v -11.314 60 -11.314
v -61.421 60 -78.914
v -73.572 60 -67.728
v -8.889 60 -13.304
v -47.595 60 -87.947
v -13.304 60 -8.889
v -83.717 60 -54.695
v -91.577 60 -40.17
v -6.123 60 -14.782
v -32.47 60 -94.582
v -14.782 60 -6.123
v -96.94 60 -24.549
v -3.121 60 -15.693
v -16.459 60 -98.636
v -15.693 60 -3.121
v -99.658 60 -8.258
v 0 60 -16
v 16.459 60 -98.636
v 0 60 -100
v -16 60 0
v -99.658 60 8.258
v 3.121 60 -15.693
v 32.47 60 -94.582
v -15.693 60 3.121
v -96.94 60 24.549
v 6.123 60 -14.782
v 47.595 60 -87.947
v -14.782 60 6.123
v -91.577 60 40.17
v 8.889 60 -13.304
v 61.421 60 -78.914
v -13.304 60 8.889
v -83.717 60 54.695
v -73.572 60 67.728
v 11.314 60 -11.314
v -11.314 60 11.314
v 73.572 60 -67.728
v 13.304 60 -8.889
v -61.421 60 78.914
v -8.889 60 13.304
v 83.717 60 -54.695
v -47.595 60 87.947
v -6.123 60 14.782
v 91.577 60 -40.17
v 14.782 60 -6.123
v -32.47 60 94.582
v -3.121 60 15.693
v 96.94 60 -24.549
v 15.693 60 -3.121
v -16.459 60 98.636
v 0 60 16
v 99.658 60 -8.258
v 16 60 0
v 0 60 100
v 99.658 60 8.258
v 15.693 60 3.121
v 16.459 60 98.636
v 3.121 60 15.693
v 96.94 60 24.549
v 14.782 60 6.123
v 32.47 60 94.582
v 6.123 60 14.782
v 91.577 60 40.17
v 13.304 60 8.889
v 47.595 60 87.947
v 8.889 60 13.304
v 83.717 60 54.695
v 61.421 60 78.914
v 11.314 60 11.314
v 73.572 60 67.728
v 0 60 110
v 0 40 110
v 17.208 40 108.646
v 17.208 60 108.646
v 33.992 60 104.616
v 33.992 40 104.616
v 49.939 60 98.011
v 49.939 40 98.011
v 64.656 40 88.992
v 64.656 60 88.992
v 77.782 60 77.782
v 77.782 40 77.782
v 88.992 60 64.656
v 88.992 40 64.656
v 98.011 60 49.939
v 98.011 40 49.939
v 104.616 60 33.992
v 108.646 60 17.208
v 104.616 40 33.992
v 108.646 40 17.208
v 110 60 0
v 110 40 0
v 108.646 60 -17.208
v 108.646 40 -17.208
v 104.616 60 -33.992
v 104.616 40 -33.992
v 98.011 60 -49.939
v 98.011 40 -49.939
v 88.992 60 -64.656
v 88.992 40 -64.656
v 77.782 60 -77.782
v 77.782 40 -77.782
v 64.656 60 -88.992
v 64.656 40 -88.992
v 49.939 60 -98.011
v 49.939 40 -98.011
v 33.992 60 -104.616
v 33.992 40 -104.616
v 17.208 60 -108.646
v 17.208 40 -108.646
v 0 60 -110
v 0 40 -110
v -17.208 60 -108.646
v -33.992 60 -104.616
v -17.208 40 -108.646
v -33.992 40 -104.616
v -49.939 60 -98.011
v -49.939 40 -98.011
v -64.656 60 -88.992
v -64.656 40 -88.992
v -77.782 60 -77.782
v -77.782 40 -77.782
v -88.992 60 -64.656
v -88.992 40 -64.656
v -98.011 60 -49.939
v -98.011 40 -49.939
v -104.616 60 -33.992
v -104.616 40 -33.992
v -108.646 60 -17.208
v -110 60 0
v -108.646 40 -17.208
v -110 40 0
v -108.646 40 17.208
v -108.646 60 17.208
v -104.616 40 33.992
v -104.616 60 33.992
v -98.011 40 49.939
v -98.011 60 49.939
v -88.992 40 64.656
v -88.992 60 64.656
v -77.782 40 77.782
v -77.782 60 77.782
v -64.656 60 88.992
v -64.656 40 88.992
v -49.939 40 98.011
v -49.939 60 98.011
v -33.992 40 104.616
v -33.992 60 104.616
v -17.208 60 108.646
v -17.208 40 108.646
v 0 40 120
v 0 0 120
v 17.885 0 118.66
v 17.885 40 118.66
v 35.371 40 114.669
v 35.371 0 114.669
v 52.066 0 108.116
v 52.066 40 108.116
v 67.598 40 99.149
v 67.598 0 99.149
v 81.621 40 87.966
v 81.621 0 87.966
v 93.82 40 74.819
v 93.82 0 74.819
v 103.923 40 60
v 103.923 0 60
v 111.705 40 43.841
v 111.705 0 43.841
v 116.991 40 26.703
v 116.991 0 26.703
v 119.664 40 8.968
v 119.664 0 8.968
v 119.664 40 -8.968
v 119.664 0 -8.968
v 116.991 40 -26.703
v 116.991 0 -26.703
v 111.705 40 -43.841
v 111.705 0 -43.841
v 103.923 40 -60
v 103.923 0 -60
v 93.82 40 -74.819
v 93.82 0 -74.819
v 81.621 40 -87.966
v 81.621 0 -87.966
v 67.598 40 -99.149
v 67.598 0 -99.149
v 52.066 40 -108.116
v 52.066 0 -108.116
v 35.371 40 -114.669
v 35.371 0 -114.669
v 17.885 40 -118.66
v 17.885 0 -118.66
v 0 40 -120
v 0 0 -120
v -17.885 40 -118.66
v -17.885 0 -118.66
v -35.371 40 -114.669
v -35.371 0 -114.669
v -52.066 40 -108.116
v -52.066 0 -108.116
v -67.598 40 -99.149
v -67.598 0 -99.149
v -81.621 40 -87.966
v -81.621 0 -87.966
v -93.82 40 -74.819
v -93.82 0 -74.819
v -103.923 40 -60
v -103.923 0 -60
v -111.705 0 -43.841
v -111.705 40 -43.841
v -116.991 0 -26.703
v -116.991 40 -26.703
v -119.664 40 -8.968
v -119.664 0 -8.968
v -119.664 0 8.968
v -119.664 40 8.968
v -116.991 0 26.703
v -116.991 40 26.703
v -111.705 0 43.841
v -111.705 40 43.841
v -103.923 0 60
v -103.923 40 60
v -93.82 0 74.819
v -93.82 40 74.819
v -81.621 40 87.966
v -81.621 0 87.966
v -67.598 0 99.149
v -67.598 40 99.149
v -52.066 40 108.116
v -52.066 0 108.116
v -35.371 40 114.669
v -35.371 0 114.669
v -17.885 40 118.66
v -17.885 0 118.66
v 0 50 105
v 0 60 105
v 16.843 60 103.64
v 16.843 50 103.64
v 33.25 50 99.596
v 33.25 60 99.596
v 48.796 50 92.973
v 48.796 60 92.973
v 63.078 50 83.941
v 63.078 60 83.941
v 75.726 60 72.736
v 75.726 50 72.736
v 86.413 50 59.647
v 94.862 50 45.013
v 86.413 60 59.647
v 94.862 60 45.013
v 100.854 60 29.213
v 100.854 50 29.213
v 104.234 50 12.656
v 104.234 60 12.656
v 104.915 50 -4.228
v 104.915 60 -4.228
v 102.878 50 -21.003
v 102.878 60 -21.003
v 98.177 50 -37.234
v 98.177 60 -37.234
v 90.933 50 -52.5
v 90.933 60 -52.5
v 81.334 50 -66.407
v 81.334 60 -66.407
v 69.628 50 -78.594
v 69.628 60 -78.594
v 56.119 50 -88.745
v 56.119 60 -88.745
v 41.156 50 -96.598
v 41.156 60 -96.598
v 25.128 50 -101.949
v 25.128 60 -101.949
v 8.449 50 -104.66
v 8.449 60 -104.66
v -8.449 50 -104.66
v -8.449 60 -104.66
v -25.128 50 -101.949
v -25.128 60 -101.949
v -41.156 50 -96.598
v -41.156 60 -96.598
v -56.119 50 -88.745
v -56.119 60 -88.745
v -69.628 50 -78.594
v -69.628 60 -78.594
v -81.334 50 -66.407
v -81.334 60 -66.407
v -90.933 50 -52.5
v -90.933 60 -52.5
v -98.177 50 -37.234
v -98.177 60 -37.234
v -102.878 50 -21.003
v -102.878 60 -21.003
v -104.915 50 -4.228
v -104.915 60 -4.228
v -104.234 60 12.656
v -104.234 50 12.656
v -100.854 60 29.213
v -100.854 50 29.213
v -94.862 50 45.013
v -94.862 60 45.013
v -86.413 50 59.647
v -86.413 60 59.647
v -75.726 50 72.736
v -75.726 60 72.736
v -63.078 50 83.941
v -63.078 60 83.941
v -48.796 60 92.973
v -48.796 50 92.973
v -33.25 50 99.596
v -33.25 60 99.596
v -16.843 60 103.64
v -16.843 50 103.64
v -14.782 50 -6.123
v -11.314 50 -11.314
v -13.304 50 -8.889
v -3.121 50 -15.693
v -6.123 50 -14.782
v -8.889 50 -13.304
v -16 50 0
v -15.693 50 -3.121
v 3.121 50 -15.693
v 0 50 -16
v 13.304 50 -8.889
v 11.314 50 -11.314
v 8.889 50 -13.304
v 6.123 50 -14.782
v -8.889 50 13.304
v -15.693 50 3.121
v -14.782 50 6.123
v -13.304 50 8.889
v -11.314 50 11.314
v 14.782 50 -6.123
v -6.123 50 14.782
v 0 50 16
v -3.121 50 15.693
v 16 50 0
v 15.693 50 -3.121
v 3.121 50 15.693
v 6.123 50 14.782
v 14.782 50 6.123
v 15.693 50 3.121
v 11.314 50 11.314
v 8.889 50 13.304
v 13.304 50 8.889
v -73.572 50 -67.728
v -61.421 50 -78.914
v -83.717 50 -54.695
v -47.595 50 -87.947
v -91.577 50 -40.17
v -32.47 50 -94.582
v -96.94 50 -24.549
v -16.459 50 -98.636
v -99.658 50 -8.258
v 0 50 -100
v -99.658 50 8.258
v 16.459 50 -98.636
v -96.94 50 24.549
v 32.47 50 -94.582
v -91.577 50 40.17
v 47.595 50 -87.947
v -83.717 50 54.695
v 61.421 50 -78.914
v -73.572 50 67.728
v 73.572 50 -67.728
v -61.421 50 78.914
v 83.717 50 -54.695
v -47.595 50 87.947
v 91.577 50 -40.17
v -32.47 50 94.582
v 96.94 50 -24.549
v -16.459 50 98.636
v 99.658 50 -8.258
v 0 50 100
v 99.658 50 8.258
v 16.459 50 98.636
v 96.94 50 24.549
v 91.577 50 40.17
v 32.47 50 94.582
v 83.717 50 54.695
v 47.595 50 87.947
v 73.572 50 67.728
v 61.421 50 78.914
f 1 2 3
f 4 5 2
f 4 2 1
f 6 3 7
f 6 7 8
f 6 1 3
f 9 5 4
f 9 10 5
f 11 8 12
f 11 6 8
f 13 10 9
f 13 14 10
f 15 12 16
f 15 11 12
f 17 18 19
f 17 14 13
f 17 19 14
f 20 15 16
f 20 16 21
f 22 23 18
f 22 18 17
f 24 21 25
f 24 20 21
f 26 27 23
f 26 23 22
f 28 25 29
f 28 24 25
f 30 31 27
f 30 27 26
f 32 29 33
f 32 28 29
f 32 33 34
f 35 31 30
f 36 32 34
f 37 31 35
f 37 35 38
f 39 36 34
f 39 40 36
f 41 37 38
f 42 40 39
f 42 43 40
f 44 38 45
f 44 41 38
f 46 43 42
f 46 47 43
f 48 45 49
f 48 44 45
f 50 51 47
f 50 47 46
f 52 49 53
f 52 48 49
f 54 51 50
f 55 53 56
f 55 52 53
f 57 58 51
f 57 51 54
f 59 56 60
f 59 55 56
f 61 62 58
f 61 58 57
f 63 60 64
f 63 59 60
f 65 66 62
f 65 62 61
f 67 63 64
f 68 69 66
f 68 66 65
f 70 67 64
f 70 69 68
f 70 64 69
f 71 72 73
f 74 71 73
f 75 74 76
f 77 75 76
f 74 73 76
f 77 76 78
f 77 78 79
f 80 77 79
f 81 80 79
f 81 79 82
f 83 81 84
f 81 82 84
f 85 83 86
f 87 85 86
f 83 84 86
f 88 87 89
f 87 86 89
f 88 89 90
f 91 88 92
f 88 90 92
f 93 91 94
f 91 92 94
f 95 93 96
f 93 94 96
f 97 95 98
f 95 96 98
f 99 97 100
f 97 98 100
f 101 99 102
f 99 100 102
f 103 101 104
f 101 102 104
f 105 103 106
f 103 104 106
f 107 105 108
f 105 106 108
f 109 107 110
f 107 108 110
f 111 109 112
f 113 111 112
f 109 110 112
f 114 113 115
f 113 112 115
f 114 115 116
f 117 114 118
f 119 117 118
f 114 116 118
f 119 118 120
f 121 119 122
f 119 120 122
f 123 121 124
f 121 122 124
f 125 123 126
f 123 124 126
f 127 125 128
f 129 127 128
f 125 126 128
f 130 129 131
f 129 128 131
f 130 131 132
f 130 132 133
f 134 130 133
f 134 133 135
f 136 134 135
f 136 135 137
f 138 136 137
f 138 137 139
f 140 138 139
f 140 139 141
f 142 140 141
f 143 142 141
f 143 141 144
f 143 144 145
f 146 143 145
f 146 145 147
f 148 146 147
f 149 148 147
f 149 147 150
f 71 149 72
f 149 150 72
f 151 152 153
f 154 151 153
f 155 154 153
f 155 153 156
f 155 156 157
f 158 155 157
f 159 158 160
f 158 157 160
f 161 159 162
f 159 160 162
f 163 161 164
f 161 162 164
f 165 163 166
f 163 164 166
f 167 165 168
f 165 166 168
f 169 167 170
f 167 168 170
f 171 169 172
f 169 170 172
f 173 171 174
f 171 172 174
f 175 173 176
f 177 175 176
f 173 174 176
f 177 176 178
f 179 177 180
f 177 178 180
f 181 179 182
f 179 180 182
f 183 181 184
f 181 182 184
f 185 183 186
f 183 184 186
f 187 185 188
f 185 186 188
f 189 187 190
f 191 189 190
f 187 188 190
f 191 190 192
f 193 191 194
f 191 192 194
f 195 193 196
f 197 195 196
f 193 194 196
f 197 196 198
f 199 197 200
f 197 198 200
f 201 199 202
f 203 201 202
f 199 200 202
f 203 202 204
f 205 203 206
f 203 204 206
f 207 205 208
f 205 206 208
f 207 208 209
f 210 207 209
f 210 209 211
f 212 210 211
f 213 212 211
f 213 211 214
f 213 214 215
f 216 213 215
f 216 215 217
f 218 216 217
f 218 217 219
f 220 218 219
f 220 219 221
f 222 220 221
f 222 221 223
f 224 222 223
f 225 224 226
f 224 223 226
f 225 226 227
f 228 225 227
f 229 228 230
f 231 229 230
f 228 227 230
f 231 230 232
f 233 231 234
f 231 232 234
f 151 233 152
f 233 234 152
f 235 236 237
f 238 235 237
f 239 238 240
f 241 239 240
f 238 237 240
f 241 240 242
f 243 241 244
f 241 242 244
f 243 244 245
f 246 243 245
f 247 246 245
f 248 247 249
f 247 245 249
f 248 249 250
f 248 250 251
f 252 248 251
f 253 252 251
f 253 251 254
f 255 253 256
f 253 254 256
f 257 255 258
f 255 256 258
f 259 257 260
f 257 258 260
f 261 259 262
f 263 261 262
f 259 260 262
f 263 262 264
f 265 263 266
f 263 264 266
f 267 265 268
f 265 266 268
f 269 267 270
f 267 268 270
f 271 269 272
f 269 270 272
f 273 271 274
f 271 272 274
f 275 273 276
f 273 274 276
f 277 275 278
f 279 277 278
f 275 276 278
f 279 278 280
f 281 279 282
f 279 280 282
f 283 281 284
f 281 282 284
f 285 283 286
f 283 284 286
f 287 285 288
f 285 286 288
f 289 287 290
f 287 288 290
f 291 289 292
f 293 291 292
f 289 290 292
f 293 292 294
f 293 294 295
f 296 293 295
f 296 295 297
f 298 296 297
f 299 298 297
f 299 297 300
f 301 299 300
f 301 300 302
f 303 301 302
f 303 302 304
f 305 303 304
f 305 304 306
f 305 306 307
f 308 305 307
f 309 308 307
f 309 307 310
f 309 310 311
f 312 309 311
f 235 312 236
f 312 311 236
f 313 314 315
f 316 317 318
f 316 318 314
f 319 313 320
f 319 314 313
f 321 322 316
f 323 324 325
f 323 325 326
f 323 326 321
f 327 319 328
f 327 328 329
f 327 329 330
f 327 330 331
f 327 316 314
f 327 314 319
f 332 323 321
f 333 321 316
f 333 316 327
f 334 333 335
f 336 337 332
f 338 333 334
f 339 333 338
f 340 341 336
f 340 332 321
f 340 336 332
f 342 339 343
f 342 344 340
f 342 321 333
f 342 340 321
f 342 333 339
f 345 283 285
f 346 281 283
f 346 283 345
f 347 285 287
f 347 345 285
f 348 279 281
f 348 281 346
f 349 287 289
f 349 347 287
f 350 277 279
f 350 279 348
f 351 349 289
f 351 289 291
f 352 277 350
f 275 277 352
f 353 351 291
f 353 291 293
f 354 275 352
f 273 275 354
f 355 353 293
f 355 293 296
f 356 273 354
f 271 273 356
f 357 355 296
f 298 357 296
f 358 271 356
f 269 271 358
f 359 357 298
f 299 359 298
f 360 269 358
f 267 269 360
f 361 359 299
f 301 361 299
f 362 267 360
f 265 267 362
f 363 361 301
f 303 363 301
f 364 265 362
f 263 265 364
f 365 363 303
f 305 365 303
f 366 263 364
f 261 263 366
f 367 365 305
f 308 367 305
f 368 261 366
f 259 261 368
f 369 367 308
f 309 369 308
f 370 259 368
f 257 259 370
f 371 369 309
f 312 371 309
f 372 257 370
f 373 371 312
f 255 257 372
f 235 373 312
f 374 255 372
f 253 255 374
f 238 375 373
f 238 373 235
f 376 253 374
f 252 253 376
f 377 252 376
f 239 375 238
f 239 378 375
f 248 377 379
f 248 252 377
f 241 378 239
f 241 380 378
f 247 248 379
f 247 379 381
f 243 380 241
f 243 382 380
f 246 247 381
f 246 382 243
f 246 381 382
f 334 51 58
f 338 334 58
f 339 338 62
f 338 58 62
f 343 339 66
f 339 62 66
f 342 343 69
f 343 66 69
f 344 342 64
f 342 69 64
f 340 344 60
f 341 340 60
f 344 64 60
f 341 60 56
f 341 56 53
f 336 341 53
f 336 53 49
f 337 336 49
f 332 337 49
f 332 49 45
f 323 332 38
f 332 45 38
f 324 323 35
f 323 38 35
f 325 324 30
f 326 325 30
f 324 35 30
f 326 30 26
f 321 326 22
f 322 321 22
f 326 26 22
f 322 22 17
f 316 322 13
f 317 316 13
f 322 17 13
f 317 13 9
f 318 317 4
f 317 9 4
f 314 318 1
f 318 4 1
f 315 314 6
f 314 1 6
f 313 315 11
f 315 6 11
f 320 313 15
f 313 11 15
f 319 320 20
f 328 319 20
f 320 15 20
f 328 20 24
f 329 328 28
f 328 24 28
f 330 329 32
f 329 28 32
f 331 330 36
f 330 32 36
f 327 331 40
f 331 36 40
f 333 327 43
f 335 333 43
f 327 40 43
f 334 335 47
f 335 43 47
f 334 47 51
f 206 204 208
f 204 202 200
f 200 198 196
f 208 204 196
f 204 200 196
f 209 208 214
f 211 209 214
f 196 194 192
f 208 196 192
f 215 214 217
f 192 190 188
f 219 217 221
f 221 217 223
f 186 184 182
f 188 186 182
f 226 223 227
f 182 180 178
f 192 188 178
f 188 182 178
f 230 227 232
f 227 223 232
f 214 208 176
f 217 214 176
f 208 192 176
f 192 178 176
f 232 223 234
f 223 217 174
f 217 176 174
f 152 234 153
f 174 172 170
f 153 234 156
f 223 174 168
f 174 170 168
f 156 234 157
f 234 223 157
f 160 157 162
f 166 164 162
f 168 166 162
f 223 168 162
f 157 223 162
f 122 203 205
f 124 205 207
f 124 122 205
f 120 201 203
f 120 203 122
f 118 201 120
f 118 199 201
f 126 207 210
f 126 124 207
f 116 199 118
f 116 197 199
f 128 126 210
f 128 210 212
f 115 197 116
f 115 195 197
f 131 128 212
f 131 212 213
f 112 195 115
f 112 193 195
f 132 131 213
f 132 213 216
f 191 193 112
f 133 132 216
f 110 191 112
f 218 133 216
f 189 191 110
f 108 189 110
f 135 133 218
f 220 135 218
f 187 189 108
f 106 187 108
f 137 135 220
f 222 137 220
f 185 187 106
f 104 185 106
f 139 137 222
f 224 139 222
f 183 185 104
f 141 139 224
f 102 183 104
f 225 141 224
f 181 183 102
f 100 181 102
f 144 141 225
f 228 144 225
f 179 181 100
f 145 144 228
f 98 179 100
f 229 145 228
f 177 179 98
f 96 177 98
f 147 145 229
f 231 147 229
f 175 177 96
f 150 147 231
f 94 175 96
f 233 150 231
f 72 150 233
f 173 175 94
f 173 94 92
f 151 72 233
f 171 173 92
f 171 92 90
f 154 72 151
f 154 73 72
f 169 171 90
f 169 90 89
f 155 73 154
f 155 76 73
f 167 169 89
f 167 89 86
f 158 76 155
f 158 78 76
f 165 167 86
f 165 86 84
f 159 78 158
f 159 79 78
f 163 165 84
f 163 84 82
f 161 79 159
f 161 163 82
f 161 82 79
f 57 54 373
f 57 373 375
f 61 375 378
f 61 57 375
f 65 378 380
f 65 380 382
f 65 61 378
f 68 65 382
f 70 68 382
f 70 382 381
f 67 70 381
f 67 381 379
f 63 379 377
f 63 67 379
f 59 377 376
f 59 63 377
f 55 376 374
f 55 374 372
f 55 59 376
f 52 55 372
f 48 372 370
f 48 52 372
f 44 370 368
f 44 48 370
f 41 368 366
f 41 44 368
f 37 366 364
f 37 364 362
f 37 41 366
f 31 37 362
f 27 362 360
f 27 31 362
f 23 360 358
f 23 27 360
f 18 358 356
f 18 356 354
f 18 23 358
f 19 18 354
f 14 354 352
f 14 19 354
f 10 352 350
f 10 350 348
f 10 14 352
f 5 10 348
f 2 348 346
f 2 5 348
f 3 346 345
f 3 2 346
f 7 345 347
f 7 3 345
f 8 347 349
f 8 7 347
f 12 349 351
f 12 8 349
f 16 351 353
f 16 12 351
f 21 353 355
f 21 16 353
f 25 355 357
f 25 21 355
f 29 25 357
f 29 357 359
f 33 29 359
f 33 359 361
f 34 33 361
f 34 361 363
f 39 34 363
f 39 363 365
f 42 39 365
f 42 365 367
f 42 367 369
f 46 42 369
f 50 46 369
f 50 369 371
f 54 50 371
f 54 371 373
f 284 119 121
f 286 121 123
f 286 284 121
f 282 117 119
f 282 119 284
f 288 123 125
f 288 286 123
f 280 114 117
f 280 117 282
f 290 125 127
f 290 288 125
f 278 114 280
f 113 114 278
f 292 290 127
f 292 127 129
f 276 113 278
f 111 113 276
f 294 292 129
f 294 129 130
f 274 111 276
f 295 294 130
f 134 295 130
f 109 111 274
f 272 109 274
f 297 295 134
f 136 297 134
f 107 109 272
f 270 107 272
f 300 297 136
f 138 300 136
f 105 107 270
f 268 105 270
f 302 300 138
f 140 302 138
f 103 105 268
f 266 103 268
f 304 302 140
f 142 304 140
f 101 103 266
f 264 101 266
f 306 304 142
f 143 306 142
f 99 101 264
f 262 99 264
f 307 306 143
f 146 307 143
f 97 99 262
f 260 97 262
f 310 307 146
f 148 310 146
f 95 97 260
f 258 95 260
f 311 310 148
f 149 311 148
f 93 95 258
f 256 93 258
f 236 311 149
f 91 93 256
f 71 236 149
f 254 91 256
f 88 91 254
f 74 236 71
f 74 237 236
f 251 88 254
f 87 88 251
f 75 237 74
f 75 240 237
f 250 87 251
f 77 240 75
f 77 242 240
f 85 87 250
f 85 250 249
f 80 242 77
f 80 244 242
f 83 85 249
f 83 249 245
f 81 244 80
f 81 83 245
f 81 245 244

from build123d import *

# Parameters (mm, degrees)
SKETCH1_R           = 120
BOSS_EXTRUDE1_DEPTH = 40
BOSS_EXTRUDE2_START = 40
SKETCH1_3_R         = 110
BOSS_EXTRUDE2_DEPTH = 20
CUT_EXTRUDE1_START  = 60
SKETCH1_5_R         = 105
SKETCH1_5_R_2       = 100
CUT_EXTRUDE1_DEPTH  = 10
SKETCH2_R           = 16
CUT_EXTRUDE2_DEPTH  = 10


with BuildPart() as part:
    # Sketch1 → Boss-Extrude1 (new body)
    with BuildSketch(Plane(origin=(0, 0, 0), x_dir=(1, 0, 0), z_dir=(0, 1, 0))):
        with Locations(Location((0, 0, 0), (0, 0, 270))):
            Circle(SKETCH1_R)
    extrude(amount=BOSS_EXTRUDE1_DEPTH)

    # Sketch1<3> → Boss-Extrude2 (add)
    with BuildSketch(Plane(origin=(0, 0, 0), x_dir=(1, 0, 0), z_dir=(0, 1, 0)).offset(BOSS_EXTRUDE2_START)):
        with Locations(Location((0, 0, 0), (0, 0, 270))):
            Circle(SKETCH1_3_R)
    extrude(amount=BOSS_EXTRUDE2_DEPTH)

    # Sketch1<5> → Cut-Extrude1 (cut)
    with BuildSketch(Plane(origin=(0, 0, 0), x_dir=(1, 0, 0), z_dir=(0, 1, 0)).offset(CUT_EXTRUDE1_START)):
        with Locations(Location((0, 0, 0), (0, 0, 270))):
            Circle(SKETCH1_5_R)
        with Locations(Location((0, 0, 0), (0, 0, 270))):
            Circle(SKETCH1_5_R_2, mode=Mode.SUBTRACT)
    extrude(amount=-CUT_EXTRUDE1_DEPTH, mode=Mode.SUBTRACT)

    # Sketch2 → Cut-Extrude2 (cut)
    with BuildSketch(Plane(origin=(0, 60, 0), x_dir=(1, 0, 0), z_dir=(0, 1, 0))):
        with Locations(Location((0, 0, 0), (0, 0, 270))):
            Circle(SKETCH2_R)
    extrude(amount=-CUT_EXTRUDE2_DEPTH, mode=Mode.SUBTRACT)


solid = part.part
